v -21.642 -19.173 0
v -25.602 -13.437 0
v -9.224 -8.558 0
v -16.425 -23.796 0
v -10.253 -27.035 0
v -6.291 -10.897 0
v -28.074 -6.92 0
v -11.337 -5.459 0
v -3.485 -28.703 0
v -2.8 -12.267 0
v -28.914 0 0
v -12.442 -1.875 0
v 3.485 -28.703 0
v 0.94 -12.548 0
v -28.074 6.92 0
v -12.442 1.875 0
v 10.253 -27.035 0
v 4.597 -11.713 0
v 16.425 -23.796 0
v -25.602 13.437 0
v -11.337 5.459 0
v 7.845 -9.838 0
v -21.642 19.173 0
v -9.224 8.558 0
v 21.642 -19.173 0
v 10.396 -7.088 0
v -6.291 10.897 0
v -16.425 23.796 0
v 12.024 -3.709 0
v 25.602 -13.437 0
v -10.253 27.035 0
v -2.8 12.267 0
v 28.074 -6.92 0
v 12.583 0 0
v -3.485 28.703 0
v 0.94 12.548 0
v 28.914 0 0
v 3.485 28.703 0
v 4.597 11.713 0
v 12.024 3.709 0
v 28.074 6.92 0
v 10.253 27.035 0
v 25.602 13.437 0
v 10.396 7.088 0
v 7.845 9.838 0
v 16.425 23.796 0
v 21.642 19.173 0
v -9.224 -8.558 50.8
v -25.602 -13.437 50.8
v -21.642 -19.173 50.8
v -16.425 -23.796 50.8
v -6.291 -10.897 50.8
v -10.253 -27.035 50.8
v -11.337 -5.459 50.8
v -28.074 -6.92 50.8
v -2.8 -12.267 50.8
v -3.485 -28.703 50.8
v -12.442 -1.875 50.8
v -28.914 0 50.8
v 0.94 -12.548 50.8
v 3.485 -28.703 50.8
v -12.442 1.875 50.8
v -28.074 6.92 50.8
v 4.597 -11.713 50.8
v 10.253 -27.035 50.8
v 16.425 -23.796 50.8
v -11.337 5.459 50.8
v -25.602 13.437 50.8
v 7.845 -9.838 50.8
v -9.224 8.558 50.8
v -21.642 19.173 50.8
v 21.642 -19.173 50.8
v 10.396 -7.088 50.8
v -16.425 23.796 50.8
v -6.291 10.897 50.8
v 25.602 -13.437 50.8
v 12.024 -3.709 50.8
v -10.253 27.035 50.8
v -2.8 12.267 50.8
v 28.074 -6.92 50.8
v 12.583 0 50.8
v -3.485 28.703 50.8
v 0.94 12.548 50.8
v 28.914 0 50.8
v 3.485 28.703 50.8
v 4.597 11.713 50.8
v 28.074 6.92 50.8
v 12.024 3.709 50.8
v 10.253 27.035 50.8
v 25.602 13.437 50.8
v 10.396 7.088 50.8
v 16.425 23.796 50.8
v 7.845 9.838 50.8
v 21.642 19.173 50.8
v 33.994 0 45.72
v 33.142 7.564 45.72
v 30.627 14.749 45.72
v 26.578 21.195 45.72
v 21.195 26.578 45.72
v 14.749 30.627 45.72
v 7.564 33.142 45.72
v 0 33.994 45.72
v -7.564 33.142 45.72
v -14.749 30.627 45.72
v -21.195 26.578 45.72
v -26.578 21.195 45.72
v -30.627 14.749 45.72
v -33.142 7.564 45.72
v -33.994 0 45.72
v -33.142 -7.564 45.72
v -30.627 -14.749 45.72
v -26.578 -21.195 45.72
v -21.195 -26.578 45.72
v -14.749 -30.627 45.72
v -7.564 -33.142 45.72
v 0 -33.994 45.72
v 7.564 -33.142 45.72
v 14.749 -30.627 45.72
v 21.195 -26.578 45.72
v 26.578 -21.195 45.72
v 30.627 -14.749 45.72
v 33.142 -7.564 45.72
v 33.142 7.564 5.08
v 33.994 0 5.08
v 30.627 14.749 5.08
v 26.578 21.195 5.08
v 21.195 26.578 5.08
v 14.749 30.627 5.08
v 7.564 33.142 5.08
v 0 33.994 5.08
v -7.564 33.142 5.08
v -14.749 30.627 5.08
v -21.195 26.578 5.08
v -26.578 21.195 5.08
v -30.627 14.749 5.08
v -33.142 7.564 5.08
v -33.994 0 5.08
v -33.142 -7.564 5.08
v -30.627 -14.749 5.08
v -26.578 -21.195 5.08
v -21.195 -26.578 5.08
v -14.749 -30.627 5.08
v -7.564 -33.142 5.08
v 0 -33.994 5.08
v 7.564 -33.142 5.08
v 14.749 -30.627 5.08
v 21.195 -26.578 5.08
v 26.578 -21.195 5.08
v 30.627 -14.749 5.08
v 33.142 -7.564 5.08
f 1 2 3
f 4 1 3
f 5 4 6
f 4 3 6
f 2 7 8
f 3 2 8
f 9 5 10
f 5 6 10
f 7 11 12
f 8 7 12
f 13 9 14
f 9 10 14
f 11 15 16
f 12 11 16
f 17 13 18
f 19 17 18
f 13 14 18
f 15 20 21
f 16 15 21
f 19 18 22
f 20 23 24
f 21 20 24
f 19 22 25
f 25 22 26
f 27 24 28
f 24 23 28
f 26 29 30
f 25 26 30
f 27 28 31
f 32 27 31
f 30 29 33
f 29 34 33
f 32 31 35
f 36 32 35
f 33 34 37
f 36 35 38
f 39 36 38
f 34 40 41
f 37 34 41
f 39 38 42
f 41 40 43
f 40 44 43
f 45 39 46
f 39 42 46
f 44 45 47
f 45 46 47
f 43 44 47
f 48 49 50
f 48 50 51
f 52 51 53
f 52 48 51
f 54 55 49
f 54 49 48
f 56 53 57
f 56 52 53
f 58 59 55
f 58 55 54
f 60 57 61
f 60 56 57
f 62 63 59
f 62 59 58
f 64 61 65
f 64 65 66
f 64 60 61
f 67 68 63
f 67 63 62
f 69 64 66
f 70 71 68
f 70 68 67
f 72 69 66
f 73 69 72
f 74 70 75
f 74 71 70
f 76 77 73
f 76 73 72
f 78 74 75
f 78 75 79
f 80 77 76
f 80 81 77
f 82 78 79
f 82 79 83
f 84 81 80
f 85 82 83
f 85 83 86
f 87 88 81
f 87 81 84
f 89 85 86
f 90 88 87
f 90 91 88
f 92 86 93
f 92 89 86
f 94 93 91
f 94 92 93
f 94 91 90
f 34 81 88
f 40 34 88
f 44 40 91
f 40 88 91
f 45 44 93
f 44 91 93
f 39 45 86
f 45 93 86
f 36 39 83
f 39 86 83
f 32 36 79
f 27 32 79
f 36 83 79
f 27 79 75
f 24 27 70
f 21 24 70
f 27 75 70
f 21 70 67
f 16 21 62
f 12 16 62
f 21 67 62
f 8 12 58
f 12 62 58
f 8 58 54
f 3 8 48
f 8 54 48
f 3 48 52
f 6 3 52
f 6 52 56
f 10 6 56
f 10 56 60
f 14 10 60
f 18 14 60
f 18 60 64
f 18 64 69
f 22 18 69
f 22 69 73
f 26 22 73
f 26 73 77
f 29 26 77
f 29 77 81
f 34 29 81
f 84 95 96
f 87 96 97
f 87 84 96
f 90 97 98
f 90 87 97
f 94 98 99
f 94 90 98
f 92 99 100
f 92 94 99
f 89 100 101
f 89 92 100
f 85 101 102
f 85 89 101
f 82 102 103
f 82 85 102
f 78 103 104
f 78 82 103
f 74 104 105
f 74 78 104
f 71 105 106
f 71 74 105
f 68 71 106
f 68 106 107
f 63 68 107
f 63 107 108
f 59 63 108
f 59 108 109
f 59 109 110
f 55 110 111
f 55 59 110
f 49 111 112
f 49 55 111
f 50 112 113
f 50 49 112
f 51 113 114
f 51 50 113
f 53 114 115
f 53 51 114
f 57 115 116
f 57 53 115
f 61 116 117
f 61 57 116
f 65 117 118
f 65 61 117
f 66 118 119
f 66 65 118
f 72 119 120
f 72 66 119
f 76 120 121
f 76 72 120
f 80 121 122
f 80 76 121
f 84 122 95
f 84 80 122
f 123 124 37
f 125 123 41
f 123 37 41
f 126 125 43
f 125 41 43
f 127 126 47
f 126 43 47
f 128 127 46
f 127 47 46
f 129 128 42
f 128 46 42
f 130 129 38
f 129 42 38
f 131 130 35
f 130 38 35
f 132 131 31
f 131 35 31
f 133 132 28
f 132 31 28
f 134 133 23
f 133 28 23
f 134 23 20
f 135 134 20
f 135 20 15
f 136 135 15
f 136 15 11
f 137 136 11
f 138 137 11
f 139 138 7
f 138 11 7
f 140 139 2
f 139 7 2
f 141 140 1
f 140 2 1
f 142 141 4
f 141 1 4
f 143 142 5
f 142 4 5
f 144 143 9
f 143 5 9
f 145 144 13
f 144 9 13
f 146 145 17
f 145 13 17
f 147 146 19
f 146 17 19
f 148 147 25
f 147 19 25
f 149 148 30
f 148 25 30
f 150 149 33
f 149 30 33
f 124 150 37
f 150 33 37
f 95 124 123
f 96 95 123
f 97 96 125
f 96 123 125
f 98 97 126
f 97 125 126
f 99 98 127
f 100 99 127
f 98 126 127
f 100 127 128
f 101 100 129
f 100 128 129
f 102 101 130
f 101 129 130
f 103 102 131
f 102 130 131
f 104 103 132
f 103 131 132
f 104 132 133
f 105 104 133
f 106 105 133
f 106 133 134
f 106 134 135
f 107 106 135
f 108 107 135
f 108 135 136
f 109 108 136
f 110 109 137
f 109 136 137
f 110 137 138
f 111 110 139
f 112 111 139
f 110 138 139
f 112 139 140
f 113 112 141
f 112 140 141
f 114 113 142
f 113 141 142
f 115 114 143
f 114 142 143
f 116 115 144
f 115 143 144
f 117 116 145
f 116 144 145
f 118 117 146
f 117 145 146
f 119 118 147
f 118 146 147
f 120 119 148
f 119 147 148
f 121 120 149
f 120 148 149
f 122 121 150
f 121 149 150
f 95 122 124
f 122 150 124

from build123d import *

# Parameters (mm, degrees)
F0_R     = 33.993952
F1_DEPTH = 50.8
F2_SIZE  = 5.08
F3_R     = 12.582727
F4_DEPTH = 76.2


with BuildPart() as f1:
    # F0 (on Top) → F1 (new body)
    with BuildSketch(Plane.XY):
        Circle(F0_R)
    extrude(amount=F1_DEPTH)

    # F2
    f2_edges = [f1.edges().sort_by_distance(p)[0] for p in [
        (-33.993952, 0, 50.8),
        (-33.993952, 0, 0),
    ]]
    chamfer(f2_edges, length=F2_SIZE)

    # F3 (on face) → F4 (cut)
    with BuildSketch(Plane.XY.offset(50.8)):
        Circle(F3_R)
    extrude(amount=-F4_DEPTH, mode=Mode.SUBTRACT)


solid = f1.part
